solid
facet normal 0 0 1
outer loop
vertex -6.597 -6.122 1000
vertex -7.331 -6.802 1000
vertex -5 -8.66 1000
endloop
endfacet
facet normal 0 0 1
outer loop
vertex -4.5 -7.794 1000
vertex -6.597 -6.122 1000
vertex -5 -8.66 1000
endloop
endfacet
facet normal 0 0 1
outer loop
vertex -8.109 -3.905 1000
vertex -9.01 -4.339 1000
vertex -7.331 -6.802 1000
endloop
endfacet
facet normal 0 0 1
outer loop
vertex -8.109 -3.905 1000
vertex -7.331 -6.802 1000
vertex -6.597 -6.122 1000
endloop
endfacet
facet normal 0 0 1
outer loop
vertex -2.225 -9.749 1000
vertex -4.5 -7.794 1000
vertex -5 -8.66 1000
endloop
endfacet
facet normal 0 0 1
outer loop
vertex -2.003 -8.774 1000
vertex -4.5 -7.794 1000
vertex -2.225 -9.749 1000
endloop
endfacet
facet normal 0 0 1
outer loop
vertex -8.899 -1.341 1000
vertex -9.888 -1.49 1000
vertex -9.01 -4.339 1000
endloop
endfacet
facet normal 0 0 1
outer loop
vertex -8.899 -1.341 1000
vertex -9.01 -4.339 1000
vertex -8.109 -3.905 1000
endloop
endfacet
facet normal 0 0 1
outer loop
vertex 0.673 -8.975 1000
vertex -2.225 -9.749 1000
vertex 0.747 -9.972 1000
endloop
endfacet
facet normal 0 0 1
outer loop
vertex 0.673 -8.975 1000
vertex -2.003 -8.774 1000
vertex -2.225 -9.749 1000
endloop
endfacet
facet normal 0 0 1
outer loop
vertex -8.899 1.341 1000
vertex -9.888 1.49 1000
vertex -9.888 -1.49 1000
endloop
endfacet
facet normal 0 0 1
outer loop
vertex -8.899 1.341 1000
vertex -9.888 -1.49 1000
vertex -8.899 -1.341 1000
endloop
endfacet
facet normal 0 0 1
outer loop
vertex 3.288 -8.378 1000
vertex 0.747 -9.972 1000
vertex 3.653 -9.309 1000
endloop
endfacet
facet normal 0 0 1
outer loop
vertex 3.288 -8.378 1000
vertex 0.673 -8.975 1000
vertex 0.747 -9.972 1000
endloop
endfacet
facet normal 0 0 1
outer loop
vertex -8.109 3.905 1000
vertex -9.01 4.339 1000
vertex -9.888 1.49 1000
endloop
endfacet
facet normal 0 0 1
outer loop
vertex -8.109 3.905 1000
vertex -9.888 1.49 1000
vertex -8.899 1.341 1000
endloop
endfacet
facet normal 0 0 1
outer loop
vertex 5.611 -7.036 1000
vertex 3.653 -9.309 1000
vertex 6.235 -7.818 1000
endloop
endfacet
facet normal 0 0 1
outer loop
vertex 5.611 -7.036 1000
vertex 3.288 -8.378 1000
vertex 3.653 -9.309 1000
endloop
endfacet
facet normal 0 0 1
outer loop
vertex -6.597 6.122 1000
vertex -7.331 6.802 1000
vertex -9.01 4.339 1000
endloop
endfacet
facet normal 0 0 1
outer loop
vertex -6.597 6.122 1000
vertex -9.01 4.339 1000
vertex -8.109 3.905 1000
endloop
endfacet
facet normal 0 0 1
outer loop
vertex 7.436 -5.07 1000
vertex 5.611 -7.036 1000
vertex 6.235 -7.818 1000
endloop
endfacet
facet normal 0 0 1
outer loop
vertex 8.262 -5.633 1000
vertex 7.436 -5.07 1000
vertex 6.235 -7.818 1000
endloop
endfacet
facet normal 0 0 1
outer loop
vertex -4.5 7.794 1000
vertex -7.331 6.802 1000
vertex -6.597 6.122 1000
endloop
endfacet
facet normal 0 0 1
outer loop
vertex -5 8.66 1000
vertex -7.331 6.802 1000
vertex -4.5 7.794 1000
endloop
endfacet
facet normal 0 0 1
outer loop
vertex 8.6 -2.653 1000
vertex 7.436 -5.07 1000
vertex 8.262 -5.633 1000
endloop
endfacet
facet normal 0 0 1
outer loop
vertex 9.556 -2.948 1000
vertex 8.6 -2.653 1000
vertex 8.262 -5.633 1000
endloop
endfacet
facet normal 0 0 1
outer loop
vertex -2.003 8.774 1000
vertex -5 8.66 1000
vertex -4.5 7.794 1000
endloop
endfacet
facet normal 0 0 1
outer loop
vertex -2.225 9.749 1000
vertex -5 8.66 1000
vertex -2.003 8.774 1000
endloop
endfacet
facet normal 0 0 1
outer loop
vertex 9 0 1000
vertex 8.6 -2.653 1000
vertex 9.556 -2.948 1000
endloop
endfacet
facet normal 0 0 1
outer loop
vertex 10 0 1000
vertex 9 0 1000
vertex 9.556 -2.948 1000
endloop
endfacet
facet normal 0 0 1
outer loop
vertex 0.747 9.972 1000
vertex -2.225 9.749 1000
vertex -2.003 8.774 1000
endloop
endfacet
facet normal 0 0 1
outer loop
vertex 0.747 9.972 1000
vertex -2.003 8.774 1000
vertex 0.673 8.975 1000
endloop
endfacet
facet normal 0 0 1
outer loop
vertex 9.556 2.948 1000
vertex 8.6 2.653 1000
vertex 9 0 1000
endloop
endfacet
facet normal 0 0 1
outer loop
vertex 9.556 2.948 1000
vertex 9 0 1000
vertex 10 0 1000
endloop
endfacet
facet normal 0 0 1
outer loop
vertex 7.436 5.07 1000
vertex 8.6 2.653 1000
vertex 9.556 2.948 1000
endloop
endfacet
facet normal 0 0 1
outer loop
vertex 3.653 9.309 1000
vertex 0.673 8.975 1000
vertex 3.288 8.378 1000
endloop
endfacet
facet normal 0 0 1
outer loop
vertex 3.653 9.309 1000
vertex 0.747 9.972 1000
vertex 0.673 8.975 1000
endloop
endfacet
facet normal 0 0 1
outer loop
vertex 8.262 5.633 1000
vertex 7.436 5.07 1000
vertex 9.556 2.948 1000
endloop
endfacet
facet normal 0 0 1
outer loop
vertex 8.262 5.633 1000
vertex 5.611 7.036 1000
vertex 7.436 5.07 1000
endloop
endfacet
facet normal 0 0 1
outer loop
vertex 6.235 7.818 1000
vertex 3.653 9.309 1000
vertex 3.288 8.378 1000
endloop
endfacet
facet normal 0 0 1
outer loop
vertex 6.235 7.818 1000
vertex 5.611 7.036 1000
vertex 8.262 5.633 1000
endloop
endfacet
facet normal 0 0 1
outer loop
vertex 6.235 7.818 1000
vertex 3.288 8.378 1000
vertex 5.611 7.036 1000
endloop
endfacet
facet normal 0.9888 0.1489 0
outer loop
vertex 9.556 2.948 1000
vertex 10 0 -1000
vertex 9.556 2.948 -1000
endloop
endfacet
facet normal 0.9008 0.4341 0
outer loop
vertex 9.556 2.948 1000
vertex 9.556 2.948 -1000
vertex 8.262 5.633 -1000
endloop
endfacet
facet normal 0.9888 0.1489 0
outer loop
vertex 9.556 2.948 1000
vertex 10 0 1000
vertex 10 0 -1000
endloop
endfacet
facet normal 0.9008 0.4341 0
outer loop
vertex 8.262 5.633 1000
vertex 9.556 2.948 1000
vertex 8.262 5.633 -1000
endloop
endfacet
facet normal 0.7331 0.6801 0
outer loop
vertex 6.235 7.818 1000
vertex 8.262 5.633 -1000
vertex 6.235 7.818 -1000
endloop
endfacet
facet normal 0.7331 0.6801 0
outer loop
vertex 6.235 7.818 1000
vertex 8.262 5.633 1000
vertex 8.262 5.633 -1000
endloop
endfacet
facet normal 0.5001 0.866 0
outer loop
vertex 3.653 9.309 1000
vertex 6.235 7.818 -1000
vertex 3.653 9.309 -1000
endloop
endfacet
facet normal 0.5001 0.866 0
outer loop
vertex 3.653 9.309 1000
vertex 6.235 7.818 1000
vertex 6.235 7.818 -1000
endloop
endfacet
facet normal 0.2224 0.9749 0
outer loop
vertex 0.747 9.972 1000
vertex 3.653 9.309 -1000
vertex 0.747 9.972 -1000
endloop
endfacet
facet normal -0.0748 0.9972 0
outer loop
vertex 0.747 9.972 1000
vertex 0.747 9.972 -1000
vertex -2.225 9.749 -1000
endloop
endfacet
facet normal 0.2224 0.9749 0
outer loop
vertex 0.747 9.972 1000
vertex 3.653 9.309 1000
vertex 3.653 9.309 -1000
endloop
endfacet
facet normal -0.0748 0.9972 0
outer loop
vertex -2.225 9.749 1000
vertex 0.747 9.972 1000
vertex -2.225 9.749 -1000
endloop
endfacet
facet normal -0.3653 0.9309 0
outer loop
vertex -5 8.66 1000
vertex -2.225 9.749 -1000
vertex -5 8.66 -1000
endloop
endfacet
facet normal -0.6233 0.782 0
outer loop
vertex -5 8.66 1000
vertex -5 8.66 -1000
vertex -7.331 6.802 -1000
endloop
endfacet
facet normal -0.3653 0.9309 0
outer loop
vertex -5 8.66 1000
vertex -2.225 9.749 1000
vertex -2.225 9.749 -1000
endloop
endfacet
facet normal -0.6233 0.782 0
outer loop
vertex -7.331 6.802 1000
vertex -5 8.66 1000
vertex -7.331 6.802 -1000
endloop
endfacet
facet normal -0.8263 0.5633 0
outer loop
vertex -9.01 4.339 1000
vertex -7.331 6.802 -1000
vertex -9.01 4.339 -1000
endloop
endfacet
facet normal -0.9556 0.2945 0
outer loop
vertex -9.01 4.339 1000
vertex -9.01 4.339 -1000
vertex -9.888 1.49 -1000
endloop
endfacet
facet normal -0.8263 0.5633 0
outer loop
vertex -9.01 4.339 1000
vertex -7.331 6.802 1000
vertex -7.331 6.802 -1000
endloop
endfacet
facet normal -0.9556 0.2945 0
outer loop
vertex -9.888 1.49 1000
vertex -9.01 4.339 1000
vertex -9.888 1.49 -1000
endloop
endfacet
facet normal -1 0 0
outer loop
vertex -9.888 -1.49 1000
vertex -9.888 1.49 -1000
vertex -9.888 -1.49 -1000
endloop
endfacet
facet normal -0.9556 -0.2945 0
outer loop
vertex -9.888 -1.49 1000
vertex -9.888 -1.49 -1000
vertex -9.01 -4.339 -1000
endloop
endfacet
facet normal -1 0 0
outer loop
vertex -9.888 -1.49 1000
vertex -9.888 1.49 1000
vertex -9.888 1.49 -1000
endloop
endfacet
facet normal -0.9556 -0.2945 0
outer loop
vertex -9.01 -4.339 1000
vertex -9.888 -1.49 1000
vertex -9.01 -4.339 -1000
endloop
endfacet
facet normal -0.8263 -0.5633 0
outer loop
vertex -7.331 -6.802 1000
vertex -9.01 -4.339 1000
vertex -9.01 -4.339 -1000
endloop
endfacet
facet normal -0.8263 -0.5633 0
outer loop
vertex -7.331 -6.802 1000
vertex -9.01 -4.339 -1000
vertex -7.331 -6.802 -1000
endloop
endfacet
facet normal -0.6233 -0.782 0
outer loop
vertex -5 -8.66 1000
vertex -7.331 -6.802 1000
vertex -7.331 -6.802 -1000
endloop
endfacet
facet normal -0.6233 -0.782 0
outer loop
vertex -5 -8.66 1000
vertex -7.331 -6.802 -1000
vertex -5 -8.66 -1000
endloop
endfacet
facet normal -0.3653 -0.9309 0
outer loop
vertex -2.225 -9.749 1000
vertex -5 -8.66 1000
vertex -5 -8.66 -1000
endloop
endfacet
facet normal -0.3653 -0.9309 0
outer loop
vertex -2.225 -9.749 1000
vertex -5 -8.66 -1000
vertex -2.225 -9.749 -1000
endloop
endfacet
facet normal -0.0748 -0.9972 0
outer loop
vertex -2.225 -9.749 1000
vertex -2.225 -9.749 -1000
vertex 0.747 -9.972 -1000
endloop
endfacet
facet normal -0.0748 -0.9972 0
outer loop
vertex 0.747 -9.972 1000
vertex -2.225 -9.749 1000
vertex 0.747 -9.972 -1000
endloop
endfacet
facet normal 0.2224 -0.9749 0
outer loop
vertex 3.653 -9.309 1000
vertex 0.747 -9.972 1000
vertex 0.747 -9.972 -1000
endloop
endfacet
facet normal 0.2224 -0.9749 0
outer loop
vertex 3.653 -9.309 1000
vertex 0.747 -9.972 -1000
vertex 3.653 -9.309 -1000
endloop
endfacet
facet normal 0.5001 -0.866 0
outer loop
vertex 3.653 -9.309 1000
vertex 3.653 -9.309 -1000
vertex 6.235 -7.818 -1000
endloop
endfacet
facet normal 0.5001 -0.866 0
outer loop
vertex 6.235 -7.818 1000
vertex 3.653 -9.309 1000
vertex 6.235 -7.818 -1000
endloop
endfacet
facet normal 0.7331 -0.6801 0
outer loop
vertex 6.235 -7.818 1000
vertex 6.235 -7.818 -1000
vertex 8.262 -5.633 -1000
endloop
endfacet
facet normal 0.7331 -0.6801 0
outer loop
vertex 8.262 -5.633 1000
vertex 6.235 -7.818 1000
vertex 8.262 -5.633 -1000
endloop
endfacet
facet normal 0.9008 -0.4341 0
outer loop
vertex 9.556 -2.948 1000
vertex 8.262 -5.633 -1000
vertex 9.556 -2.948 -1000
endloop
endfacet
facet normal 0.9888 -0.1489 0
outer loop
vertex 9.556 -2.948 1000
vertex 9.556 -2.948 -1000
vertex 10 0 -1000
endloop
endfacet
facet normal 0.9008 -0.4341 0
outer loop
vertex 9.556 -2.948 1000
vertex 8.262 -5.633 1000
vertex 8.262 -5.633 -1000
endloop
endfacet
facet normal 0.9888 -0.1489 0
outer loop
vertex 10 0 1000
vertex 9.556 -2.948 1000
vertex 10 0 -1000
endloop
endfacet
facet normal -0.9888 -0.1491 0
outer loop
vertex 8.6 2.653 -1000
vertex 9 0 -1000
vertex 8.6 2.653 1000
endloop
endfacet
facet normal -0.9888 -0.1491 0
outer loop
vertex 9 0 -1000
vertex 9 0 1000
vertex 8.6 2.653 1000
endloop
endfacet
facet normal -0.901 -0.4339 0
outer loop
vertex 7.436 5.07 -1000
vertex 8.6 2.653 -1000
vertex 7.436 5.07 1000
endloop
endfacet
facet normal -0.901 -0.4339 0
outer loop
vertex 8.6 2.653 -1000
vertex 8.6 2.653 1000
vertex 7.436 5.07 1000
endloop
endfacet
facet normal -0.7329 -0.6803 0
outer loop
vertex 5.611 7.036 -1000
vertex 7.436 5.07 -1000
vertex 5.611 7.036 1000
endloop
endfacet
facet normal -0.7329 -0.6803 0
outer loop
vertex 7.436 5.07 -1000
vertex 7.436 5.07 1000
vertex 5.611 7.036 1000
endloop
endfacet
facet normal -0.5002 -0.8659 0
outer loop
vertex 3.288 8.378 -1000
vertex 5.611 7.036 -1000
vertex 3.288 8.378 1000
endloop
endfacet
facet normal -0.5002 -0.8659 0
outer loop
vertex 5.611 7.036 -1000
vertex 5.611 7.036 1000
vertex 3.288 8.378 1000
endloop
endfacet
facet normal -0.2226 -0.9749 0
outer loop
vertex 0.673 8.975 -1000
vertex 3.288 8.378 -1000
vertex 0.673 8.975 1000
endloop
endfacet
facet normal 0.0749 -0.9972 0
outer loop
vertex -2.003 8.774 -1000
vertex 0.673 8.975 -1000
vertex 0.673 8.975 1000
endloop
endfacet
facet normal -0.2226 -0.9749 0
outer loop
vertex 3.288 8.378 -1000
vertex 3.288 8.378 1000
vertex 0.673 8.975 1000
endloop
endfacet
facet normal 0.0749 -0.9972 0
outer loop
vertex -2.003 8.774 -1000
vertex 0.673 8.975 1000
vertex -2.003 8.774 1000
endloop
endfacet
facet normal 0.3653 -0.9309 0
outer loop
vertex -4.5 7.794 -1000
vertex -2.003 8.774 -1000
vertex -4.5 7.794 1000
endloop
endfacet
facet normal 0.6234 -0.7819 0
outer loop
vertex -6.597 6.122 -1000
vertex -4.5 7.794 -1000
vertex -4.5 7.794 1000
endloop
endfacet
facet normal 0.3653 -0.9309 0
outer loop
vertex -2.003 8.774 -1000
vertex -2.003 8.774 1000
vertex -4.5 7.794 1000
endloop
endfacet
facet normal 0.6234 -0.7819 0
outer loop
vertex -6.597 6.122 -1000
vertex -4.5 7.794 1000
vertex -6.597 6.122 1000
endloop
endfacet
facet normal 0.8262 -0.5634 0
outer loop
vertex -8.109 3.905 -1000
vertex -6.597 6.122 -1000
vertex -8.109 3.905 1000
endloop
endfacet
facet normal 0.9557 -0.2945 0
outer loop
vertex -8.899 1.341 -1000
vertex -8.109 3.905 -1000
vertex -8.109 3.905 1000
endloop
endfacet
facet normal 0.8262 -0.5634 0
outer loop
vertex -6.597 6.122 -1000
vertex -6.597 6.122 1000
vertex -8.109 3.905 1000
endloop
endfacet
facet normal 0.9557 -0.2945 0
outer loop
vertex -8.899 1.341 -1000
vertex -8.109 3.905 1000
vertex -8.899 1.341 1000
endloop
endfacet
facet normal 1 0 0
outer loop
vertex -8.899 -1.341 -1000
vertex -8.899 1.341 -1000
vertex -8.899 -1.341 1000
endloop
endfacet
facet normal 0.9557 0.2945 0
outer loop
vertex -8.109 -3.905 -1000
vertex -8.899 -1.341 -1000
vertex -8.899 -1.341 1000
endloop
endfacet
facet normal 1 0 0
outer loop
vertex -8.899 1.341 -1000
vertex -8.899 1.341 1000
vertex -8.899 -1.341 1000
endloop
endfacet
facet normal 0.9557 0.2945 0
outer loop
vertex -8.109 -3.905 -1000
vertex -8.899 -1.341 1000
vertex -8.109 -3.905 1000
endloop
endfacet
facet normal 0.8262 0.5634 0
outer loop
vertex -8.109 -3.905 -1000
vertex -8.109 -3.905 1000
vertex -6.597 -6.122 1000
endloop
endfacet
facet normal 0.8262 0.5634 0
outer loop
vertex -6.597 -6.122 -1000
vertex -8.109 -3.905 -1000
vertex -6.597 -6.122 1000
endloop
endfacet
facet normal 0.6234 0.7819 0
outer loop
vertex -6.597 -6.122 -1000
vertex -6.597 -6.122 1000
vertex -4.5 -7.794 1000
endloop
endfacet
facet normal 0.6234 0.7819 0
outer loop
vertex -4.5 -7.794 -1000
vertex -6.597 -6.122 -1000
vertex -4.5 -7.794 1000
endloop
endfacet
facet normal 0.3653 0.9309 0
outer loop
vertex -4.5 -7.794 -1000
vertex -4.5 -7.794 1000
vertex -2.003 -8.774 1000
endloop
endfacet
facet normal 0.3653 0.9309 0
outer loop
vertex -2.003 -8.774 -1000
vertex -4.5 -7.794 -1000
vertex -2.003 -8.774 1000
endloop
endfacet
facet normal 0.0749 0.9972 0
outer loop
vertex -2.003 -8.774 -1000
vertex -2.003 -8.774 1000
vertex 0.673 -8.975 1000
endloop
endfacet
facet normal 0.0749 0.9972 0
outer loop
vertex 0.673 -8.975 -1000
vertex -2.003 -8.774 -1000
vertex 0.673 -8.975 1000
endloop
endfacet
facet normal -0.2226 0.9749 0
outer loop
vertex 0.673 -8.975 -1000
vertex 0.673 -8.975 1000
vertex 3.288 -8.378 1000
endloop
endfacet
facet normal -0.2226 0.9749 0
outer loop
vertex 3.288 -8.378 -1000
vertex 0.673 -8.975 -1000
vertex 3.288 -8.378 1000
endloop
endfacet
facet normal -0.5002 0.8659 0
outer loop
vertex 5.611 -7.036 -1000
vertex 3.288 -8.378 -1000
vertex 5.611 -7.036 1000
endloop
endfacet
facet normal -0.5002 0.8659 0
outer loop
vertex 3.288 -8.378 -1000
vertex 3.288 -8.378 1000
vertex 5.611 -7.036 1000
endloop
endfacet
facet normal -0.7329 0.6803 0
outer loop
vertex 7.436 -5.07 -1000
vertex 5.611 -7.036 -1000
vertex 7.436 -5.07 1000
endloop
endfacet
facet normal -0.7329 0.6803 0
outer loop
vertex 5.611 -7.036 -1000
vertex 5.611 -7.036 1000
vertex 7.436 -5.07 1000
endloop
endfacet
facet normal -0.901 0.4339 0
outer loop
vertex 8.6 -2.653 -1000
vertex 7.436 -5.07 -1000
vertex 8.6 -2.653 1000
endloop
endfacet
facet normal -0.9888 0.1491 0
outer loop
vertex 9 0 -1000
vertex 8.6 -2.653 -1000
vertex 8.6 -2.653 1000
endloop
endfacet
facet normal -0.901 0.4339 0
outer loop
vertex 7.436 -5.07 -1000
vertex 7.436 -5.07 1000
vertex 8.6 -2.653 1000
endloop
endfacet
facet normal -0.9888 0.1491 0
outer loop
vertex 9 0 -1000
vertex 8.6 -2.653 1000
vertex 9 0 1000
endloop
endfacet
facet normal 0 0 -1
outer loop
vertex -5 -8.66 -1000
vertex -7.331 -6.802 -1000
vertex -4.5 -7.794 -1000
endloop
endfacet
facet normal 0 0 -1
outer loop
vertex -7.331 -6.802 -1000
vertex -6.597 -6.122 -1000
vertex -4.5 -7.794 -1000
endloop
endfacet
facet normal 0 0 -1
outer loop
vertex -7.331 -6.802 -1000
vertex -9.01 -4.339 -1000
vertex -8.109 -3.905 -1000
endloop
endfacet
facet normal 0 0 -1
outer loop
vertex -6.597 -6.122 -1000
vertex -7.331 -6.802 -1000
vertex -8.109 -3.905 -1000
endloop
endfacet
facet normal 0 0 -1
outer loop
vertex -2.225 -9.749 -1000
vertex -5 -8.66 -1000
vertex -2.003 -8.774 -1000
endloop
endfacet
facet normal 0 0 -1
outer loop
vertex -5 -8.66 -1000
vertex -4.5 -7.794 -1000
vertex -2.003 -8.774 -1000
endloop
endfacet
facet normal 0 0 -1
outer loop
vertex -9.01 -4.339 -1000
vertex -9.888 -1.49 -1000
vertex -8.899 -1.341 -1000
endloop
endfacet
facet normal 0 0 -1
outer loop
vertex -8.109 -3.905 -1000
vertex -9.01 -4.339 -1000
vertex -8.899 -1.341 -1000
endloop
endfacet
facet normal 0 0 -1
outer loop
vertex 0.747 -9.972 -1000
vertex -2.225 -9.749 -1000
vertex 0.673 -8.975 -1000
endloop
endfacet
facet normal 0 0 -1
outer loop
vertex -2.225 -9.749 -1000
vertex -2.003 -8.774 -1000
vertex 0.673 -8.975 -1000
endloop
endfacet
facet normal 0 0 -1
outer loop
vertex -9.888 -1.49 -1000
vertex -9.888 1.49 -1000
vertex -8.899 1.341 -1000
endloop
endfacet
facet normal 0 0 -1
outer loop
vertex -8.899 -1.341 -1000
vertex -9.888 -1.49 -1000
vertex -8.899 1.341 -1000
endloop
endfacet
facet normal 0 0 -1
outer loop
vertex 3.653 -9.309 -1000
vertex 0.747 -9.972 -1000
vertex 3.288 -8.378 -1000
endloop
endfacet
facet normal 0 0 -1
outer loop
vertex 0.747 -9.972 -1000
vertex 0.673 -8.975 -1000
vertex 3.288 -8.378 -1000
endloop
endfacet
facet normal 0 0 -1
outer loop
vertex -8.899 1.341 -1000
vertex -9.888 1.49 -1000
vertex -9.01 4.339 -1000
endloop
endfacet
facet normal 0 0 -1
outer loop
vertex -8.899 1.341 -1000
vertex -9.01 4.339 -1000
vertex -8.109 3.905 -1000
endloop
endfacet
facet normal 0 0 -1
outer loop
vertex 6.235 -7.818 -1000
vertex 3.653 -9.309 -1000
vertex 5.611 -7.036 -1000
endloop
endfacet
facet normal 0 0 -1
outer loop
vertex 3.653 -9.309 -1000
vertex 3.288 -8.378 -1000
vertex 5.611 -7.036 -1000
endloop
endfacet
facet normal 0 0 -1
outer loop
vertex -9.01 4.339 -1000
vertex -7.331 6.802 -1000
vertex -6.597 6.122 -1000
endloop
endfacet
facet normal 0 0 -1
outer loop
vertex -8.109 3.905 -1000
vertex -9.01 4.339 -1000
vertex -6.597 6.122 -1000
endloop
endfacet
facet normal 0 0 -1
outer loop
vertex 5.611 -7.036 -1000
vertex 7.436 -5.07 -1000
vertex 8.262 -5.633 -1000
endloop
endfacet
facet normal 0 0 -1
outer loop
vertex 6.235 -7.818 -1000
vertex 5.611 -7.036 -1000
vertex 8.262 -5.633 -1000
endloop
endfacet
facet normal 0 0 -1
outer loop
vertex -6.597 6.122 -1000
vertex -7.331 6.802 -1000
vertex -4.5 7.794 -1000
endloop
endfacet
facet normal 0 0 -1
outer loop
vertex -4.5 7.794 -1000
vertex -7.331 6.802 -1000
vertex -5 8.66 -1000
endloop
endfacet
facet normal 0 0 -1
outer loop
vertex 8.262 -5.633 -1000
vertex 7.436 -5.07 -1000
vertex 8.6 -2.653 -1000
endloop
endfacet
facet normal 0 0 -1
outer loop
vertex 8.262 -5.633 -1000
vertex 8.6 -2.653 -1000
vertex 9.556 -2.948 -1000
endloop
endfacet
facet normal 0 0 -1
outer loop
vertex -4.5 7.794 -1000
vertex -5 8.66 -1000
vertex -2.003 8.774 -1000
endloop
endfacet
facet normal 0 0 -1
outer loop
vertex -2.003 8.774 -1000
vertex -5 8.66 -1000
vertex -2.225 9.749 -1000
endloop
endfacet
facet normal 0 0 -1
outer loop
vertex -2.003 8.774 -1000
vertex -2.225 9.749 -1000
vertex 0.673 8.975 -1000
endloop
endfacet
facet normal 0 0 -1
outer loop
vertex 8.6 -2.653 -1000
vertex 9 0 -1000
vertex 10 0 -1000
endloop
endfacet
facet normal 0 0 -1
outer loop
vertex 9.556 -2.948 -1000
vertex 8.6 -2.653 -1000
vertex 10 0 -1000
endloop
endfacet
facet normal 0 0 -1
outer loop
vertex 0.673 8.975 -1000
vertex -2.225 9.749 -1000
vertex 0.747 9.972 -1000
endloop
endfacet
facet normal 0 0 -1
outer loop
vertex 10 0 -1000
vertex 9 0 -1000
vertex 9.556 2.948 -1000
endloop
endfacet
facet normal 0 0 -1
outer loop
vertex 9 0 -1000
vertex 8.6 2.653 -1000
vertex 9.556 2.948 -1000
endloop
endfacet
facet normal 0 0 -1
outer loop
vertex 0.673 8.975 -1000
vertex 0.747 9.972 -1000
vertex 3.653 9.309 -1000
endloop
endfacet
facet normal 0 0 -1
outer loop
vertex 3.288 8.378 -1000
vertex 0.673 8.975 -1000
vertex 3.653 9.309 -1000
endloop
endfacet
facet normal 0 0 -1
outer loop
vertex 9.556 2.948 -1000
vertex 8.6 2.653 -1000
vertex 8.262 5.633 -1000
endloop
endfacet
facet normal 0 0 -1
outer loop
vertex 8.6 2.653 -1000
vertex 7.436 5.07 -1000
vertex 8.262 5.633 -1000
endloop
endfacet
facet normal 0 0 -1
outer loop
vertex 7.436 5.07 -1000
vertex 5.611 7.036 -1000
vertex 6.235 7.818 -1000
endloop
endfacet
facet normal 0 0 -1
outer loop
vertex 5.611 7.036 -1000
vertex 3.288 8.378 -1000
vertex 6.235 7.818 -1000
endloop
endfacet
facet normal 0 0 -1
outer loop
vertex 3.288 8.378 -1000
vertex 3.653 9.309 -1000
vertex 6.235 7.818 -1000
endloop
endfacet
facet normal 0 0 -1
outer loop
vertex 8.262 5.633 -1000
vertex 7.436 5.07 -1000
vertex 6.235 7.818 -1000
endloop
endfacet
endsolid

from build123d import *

# Parameters (mm, degrees)
F0_R     = 10
F2_DEPTH = 1000
F1_R     = 9
F3_DEPTH = 1000.001
F4_DEPTH = 1000.001


with BuildPart() as f2:
    # F0 (on Top) → F2 (new body, symmetric)
    with BuildSketch(Plane.XY):
        Circle(F0_R)
    extrude(amount=F2_DEPTH, both=True)

    # F1 (on Top) → F3 (cut, through all)
    with BuildSketch(Plane.XY):
        Circle(F1_R)
    extrude(amount=-F3_DEPTH, mode=Mode.SUBTRACT)

    # F1 (on Top) → F4 (cut, through all)
    with BuildSketch(Plane.XY):
        Circle(F1_R)
    extrude(amount=F4_DEPTH, mode=Mode.SUBTRACT)


solid = f2.part
